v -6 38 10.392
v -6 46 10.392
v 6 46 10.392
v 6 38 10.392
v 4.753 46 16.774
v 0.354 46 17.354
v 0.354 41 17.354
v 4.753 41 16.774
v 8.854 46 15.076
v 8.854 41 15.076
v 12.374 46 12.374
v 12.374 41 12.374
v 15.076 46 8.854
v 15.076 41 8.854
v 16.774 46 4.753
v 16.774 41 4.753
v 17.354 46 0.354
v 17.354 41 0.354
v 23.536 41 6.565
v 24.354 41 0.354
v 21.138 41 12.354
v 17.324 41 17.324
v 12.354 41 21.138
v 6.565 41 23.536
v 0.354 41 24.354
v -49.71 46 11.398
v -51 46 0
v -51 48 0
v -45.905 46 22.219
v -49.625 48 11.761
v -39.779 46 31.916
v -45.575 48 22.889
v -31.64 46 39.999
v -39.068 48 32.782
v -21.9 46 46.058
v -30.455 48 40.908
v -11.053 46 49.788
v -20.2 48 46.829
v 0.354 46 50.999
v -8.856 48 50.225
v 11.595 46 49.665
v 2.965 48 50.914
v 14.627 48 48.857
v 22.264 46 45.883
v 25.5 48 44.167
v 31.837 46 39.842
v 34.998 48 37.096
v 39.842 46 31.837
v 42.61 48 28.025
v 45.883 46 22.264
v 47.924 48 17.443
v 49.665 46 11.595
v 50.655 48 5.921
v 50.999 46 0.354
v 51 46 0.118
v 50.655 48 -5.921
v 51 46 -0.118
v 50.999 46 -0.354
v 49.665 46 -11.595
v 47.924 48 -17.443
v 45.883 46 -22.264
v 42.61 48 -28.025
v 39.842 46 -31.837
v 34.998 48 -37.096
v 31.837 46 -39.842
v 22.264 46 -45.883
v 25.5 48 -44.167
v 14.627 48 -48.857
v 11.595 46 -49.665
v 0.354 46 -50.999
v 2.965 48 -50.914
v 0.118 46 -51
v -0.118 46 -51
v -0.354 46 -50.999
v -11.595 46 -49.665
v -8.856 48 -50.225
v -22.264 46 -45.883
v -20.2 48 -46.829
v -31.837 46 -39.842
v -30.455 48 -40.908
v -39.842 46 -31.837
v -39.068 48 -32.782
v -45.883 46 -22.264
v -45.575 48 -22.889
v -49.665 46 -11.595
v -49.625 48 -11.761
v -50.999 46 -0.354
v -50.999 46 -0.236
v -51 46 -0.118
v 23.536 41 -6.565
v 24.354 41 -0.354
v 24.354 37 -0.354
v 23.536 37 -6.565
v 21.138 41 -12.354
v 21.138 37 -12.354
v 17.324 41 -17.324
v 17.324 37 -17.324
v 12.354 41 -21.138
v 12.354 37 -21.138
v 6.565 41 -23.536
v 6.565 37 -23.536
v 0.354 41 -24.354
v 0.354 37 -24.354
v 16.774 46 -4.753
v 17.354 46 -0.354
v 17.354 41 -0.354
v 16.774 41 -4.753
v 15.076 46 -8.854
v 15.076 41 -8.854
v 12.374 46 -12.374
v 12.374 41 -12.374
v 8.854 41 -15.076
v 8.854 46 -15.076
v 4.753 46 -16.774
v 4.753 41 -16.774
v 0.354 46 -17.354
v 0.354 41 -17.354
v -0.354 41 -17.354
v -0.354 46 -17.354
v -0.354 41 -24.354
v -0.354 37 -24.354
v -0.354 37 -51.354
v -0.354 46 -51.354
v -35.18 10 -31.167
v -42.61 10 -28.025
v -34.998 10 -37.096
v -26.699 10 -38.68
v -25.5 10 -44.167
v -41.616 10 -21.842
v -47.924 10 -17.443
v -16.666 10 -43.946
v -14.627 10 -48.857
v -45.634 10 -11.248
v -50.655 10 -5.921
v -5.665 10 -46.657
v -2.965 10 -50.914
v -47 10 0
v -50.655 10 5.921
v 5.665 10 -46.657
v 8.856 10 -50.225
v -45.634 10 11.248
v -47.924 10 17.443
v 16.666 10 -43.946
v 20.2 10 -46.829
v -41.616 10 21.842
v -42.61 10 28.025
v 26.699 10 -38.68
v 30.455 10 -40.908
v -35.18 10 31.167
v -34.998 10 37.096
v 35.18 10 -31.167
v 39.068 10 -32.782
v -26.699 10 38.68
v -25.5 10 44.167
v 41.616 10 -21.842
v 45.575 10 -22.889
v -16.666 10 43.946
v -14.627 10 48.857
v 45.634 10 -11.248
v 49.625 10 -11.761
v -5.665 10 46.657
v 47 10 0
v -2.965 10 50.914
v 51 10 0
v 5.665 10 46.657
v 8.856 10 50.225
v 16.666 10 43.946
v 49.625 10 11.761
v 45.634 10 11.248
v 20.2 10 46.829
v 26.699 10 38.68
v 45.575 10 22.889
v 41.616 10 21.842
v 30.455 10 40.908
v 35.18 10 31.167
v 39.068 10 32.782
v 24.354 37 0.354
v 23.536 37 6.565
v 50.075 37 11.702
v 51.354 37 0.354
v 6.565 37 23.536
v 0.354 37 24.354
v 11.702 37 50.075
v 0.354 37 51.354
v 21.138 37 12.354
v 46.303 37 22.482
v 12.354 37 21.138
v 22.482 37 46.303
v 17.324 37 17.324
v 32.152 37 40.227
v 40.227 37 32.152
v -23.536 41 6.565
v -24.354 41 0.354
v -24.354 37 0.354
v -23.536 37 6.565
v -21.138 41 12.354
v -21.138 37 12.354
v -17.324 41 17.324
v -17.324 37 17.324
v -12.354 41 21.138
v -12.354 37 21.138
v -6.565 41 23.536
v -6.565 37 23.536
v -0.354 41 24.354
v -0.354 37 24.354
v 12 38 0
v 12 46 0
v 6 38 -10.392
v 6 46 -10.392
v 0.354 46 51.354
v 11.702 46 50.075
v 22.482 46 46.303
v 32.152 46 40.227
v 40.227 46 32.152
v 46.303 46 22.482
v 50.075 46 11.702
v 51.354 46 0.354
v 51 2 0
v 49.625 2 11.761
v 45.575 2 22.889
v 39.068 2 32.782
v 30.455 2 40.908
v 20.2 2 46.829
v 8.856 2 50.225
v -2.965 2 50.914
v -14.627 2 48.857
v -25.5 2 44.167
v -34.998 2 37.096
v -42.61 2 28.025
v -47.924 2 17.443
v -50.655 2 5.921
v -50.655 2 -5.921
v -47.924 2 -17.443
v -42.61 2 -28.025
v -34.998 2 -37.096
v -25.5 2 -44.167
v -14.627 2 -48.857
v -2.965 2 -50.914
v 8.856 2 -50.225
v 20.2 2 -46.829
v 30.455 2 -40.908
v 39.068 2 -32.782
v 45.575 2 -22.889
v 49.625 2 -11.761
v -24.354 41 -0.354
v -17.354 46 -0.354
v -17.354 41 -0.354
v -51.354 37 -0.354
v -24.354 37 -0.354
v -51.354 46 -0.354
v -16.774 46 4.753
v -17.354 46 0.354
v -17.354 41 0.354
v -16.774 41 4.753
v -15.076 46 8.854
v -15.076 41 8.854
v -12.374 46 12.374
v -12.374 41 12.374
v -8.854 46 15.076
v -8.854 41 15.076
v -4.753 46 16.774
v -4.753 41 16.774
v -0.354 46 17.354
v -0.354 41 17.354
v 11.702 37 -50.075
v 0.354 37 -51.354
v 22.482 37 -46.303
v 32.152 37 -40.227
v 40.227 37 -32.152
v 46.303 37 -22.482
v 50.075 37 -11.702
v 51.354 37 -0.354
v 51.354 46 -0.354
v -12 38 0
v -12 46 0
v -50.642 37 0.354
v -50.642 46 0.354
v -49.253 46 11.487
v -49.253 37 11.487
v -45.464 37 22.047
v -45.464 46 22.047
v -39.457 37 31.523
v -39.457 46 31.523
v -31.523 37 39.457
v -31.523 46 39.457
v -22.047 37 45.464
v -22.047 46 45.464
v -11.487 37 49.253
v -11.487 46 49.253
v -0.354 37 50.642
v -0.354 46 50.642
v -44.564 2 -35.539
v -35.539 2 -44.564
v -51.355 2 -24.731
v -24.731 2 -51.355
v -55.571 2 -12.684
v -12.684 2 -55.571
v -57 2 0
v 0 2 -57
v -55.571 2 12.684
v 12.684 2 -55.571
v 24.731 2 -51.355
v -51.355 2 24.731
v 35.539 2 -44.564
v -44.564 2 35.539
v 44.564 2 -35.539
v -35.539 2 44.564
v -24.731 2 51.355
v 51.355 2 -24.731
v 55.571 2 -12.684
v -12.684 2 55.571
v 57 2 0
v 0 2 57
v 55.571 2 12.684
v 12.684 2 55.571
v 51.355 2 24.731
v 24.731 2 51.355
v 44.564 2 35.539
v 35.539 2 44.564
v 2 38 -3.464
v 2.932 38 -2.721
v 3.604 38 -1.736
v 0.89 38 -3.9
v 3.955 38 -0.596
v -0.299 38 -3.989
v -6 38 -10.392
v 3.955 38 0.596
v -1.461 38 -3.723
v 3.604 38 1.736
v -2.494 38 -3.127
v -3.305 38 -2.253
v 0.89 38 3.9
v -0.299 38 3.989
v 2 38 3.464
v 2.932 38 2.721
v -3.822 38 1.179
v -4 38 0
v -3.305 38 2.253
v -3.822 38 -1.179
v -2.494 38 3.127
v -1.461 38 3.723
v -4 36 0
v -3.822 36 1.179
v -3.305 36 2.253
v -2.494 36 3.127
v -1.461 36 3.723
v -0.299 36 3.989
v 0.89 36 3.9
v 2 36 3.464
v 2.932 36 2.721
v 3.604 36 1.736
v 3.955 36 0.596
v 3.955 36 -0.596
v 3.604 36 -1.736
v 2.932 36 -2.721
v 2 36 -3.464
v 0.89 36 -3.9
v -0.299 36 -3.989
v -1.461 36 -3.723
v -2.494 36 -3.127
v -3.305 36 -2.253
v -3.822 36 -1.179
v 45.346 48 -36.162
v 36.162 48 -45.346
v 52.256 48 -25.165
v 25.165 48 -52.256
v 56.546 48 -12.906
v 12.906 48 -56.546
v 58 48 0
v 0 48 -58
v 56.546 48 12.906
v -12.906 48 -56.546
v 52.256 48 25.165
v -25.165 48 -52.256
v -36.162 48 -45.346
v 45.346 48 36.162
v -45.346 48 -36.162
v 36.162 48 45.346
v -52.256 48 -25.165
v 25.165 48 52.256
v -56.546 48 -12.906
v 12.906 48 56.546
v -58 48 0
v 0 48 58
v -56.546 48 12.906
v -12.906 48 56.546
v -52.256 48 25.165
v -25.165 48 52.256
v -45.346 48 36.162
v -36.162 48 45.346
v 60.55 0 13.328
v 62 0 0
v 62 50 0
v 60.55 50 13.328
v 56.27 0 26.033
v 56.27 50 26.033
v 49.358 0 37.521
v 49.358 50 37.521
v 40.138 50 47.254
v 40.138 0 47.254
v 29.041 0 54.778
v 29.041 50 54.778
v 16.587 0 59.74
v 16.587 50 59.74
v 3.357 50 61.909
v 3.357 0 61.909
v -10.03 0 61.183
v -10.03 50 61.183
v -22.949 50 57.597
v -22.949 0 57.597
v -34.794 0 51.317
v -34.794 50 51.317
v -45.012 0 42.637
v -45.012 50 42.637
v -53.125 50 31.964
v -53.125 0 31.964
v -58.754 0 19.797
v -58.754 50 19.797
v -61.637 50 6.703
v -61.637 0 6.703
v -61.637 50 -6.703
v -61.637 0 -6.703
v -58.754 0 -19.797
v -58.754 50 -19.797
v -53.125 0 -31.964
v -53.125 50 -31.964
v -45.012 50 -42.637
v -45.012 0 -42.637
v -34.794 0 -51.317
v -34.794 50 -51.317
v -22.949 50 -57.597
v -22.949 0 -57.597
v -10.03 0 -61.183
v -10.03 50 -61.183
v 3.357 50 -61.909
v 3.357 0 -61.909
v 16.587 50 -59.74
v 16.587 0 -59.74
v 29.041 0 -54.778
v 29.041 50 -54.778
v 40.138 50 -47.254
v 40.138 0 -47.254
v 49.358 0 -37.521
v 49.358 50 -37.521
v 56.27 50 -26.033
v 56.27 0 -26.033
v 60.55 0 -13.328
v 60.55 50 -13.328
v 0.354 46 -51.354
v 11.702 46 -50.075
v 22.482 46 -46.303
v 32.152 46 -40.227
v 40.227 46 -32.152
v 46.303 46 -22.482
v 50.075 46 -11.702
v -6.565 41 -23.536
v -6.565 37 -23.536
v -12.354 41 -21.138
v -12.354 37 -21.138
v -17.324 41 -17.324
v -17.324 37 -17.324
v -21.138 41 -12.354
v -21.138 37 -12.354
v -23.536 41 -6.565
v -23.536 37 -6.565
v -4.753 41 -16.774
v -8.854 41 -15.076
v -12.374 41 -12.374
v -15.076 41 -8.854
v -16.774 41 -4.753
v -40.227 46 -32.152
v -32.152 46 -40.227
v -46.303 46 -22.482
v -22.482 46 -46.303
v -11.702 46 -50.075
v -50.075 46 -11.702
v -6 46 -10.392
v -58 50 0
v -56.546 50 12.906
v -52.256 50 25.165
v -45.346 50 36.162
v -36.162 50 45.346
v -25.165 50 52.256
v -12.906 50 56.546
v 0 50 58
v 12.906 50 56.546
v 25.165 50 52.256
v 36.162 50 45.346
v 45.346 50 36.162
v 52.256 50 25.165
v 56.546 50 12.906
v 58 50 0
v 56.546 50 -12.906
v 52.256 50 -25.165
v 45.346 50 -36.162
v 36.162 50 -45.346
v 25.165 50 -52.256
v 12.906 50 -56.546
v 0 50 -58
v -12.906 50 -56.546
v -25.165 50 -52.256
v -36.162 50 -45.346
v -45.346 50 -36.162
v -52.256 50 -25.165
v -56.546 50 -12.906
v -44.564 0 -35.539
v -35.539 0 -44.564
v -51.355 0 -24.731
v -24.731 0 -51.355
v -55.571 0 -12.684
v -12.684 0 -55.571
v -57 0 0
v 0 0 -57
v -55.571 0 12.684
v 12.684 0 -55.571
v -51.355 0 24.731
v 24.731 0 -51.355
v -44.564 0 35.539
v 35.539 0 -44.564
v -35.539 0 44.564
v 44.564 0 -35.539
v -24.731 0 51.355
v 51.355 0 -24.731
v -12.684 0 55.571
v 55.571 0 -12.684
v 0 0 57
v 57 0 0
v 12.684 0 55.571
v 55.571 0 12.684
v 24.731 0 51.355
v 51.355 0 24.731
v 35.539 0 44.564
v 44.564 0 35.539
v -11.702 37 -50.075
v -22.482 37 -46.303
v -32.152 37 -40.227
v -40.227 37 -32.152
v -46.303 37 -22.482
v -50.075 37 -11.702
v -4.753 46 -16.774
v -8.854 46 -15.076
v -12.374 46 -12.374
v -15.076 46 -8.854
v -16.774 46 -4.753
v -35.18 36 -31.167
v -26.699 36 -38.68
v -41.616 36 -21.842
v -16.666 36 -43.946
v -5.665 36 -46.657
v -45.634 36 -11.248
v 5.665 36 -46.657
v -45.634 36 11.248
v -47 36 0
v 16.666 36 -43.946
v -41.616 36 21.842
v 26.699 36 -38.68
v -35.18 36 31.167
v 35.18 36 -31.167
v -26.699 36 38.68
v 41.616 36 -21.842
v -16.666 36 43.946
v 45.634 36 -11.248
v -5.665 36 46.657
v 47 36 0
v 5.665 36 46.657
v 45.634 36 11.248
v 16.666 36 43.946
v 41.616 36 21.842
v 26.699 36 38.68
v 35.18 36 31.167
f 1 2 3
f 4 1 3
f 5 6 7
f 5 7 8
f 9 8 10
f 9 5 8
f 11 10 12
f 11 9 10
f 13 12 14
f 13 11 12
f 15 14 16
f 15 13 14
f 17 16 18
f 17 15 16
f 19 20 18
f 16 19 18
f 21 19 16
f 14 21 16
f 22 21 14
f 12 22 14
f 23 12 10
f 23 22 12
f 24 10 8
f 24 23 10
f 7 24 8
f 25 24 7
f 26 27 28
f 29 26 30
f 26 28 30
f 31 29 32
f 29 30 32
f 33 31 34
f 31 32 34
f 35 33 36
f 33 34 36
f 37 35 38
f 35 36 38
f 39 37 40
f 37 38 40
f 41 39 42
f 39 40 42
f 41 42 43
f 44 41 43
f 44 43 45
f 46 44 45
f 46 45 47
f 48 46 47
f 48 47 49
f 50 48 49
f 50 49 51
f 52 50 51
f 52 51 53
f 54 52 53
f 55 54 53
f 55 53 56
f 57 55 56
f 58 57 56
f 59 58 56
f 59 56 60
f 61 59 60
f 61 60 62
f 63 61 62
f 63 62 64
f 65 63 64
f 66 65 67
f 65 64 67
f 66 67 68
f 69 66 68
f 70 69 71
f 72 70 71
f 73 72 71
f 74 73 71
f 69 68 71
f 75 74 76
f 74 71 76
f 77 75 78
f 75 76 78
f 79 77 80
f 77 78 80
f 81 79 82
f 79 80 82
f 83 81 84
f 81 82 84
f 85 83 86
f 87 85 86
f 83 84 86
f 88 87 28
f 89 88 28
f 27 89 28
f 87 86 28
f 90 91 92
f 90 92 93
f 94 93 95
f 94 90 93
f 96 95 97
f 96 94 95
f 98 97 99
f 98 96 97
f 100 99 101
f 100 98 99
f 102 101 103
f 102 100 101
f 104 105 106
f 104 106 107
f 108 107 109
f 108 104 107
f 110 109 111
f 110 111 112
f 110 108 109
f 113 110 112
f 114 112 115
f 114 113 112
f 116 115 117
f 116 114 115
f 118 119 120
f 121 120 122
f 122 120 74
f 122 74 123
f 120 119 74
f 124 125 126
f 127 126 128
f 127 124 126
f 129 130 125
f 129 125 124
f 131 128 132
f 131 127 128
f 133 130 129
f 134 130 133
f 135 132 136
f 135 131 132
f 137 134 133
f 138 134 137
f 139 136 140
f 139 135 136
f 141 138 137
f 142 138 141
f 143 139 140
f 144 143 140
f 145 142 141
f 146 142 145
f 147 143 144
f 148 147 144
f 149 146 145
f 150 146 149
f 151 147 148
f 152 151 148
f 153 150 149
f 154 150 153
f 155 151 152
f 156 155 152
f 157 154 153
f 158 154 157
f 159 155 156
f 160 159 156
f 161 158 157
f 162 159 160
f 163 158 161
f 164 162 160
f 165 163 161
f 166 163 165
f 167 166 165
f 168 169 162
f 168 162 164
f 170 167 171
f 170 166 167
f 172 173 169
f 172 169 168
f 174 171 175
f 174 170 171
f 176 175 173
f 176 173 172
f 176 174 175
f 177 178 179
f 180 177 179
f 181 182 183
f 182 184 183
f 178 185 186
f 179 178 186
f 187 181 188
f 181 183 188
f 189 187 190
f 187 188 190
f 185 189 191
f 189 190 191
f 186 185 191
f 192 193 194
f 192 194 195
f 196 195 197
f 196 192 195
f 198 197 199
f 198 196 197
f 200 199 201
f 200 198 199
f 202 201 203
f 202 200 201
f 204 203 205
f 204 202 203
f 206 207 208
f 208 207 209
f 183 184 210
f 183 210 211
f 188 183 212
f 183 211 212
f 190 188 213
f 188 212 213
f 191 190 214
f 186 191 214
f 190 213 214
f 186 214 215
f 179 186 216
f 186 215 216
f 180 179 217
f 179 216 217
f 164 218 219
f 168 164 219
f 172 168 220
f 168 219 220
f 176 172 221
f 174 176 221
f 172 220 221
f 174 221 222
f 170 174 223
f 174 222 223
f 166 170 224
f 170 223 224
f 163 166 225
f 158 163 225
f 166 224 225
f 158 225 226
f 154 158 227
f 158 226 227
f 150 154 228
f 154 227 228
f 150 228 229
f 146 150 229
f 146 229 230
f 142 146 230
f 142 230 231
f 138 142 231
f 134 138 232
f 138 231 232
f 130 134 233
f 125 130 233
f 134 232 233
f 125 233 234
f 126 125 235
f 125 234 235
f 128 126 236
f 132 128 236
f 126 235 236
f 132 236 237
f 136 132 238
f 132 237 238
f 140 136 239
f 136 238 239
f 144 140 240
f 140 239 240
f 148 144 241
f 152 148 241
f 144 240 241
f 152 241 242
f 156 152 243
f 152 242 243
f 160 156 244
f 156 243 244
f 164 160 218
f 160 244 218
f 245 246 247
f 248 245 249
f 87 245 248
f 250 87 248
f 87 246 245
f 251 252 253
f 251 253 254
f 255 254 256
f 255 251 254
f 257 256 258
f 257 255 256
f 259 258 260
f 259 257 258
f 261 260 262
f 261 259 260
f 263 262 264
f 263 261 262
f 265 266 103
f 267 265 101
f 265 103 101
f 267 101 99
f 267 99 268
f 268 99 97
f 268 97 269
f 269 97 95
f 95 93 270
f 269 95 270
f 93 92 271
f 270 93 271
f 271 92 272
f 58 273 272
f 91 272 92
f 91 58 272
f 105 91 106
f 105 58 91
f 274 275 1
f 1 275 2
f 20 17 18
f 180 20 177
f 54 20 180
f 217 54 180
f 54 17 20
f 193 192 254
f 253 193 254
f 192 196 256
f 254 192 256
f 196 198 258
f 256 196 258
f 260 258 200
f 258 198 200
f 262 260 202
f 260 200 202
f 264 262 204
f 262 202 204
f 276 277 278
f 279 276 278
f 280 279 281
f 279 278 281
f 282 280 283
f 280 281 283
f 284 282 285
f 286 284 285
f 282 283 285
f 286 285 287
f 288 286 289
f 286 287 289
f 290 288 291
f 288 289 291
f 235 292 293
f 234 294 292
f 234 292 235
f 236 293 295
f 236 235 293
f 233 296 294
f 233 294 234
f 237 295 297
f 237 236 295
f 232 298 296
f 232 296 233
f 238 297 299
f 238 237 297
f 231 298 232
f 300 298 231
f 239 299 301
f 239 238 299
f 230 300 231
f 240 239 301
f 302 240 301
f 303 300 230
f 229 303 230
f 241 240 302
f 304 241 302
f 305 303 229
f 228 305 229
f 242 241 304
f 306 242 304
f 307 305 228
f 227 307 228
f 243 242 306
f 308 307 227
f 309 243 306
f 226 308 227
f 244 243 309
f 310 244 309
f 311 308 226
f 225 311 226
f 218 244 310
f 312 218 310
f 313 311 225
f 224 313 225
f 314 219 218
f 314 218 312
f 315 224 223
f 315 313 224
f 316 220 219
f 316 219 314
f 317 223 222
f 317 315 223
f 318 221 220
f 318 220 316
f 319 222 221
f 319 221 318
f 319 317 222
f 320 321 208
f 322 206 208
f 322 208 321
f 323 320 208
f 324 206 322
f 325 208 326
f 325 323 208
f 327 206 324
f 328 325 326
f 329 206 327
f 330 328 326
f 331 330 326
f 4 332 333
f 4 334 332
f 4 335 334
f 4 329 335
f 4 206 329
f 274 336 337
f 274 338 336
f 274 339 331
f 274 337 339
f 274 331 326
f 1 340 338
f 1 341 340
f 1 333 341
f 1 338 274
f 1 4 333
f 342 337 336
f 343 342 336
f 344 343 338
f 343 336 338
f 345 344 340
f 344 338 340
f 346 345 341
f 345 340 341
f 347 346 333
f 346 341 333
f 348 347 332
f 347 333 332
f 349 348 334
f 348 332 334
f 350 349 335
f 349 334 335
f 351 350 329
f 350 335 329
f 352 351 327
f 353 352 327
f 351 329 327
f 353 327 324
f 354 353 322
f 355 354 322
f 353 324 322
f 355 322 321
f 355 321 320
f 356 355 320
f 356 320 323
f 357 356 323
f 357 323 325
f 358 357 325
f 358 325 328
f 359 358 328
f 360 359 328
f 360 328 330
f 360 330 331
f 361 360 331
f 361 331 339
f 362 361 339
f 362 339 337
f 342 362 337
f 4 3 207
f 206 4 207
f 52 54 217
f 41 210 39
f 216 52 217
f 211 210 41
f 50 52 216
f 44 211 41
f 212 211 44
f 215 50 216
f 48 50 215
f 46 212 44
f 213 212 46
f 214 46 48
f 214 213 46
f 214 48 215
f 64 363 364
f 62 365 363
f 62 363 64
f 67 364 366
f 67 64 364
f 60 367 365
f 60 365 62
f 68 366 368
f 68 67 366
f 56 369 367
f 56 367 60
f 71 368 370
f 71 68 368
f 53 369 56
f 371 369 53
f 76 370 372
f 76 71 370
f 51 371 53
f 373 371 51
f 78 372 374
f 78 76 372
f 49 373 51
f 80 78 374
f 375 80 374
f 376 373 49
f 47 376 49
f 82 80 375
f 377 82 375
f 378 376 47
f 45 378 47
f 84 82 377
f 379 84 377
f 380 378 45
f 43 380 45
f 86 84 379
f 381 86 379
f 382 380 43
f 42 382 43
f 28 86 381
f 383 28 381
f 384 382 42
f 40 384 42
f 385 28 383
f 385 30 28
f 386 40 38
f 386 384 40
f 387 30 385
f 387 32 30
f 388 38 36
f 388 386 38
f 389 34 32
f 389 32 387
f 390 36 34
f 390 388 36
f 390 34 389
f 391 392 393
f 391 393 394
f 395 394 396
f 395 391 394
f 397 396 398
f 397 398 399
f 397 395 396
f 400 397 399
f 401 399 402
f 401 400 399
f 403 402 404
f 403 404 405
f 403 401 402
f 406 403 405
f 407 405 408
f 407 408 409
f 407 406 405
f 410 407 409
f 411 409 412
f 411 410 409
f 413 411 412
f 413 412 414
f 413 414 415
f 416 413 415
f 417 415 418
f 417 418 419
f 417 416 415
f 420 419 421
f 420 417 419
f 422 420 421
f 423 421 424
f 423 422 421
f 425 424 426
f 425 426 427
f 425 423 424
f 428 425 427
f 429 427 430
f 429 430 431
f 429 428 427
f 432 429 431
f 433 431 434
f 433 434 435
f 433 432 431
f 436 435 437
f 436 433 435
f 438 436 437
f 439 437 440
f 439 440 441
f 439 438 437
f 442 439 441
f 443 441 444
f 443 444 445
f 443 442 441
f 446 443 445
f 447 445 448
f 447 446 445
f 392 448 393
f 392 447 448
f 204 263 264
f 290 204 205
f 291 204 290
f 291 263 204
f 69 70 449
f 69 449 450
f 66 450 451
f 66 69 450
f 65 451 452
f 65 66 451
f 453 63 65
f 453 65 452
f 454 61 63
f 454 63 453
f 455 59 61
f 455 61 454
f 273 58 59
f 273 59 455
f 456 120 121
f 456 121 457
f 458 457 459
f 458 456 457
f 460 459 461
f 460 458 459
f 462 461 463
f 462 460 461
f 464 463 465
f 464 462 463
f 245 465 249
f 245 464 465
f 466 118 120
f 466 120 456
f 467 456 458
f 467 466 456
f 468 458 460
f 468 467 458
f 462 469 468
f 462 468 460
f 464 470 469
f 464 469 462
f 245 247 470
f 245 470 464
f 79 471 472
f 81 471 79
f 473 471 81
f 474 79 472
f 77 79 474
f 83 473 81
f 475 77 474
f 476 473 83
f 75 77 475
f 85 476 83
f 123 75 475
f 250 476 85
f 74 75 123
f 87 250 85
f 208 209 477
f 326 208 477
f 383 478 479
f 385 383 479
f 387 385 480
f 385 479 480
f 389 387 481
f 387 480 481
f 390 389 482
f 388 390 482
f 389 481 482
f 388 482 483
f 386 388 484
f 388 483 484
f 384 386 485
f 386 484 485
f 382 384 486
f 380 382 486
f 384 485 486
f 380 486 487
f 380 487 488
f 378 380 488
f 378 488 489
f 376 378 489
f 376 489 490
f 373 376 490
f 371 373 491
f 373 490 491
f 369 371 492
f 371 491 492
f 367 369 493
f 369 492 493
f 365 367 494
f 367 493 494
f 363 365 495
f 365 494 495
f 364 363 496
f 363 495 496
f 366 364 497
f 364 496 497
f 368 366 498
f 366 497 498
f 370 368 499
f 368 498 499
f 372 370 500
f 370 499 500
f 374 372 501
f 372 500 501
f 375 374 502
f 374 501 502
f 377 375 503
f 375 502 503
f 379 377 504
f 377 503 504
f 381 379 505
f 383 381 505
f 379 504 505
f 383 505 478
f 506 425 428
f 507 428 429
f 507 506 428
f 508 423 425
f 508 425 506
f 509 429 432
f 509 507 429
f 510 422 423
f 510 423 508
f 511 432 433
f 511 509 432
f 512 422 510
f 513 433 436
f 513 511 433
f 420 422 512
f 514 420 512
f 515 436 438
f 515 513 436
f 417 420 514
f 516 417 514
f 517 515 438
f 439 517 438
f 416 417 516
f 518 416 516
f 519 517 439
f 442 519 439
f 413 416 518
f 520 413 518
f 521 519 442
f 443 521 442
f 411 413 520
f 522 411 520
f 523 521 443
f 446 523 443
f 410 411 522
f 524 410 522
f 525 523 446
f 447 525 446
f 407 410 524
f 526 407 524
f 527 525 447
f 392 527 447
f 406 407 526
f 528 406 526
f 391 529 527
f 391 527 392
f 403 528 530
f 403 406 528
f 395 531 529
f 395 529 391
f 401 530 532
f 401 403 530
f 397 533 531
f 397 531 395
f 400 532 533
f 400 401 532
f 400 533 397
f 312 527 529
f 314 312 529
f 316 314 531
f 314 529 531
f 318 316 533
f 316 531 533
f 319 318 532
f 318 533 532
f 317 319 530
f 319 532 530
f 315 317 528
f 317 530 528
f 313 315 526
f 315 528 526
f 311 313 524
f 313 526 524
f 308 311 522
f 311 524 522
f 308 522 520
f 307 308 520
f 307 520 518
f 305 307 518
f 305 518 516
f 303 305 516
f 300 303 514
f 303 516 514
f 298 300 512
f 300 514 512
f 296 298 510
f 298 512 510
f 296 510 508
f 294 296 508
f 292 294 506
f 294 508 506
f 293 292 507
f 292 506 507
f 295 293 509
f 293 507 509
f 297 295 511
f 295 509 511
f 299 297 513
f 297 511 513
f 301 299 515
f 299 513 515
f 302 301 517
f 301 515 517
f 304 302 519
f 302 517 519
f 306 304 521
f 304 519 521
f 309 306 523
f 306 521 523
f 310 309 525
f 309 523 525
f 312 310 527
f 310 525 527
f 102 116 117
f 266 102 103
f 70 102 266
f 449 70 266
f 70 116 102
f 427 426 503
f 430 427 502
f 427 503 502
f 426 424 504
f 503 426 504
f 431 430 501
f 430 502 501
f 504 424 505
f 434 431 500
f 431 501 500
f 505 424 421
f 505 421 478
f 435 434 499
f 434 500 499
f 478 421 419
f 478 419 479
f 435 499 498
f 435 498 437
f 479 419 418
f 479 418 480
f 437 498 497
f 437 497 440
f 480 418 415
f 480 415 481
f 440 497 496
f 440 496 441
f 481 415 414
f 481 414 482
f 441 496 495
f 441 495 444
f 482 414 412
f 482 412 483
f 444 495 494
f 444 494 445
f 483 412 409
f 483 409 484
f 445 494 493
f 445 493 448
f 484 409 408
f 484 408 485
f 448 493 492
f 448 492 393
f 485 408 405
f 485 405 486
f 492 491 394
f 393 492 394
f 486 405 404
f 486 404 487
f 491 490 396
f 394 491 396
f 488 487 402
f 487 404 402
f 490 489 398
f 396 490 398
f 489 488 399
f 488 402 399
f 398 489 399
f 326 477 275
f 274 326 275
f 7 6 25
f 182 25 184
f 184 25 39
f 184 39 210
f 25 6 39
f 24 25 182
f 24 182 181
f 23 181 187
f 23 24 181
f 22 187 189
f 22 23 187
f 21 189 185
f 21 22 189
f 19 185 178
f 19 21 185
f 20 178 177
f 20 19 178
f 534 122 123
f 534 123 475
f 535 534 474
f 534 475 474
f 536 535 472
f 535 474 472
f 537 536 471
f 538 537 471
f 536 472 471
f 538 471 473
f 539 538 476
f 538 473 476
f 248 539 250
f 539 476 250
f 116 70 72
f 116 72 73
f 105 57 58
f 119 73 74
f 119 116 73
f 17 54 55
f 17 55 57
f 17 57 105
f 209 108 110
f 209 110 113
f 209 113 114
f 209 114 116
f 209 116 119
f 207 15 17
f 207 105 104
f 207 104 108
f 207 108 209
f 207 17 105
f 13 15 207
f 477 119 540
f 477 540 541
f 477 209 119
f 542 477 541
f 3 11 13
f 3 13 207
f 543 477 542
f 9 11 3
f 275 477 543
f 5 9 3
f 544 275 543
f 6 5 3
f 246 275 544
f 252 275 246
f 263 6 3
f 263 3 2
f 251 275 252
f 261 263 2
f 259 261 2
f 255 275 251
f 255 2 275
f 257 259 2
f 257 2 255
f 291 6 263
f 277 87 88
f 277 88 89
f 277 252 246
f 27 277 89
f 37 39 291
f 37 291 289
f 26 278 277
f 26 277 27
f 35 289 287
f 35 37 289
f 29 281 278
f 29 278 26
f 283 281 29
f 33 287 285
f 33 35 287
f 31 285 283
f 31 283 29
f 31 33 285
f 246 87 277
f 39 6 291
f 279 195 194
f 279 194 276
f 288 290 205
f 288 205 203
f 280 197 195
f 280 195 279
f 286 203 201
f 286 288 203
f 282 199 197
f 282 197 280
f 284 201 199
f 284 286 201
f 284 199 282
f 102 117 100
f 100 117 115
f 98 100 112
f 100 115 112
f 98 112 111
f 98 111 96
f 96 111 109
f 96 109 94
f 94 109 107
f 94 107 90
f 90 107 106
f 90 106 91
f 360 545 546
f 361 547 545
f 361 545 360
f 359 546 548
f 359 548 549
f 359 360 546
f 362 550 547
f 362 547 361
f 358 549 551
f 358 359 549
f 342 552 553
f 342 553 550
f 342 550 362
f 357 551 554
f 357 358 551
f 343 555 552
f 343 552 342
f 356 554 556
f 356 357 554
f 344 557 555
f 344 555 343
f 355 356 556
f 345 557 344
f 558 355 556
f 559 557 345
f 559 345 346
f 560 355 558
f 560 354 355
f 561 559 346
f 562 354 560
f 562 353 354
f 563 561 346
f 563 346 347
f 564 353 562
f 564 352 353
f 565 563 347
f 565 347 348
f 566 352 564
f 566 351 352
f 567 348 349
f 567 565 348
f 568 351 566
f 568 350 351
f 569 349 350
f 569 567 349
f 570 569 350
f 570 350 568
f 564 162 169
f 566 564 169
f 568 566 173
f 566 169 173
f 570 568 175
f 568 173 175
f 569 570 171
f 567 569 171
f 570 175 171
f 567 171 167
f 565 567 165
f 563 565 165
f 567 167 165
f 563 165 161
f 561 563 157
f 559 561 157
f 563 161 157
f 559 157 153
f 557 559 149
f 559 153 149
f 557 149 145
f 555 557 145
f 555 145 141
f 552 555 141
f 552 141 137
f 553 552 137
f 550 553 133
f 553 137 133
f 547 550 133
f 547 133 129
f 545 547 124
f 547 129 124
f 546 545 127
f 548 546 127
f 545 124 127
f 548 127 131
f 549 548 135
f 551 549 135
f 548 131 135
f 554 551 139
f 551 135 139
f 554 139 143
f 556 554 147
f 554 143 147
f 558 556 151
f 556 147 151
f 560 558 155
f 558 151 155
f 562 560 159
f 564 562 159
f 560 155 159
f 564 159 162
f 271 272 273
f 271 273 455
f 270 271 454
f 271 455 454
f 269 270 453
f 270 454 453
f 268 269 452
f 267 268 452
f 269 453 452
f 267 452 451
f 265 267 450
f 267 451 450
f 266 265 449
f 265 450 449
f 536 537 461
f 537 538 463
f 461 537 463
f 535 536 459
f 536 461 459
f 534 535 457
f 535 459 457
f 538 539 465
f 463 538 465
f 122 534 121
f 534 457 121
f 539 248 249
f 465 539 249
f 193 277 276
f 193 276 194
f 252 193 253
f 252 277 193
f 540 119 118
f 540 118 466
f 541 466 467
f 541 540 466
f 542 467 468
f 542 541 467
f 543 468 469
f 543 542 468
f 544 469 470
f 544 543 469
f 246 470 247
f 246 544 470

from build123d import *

# Parameters (mm, degrees)
SKETCH012_AS_DRAWN_R                 = 62
EXTRUDE005_DEPTH                     = 50
EXTRUDE005_ONTO_SKETCH012_ROLL_ANGLE = 90
SKETCH013_R                          = 57
POCKET003_DEPTH                      = 2
SKETCH014_R                          = 51
POCKET004_DEPTH                      = 8
SKETCH015_R                          = 47
POCKET005_DEPTH                      = 26
SKETCH016_R                          = 58
POCKET006_DEPTH                      = 2
SKETCH017_R                          = 51
POCKET007_DEPTH                      = 2
POCKET008_DEPTH                      = 9
POCKET009_DEPTH                      = 5
POCKET010_DEPTH                      = 8
SKETCH022_R                          = 4
POCKET011_DEPTH                      = 38.001


with BuildPart() as part:
    # Sketch012 as drawn → Extrude005 (new)
    with BuildSketch(Plane.XY):
        Circle(SKETCH012_AS_DRAWN_R)
    extrude(amount=-EXTRUDE005_DEPTH)


with BuildPart() as part_1:
    # Extrude005 onto Sketch012 roll: moved
    add(part.part.rotate(Axis((0, 0, 0), (1, 0, 0)), EXTRUDE005_ONTO_SKETCH012_ROLL_ANGLE))


with BuildPart() as part_2:
    # Extrude005 onto Sketch012 placement: moved
    add(part_1.part)

    # Sketch013 → Pocket003 (cut)
    with BuildSketch(Plane.XZ):
        Circle(SKETCH013_R)
    extrude(amount=-POCKET003_DEPTH, mode=Mode.SUBTRACT)

    # Sketch014 → Pocket004 (cut)
    with BuildSketch(Plane.XZ.offset(-2)):
        Circle(SKETCH014_R)
    extrude(amount=-POCKET004_DEPTH, mode=Mode.SUBTRACT)

    # Sketch015 → Pocket005 (cut)
    with BuildSketch(Plane.XZ.offset(-10)):
        Circle(SKETCH015_R)
    extrude(amount=-POCKET005_DEPTH, mode=Mode.SUBTRACT)

    # Sketch016 → Pocket006 (cut)
    with BuildSketch(Plane(origin=(0, 50, 0), x_dir=(-1, 0, 0), z_dir=(0, 1, 0))):
        Circle(SKETCH016_R)
    extrude(amount=-POCKET006_DEPTH, mode=Mode.SUBTRACT)

    # Sketch017 → Pocket007 (cut)
    with BuildSketch(Plane(origin=(0, 48, 0), x_dir=(-1, 0, 0), z_dir=(0, 1, 0))):
        Circle(SKETCH017_R)
    extrude(amount=-POCKET007_DEPTH, mode=Mode.SUBTRACT)

    # Sketch019 → Pocket008 (cut)
    with BuildSketch(Plane(origin=(0, 46, 0), x_dir=(-1, 0, 0), z_dir=(0, 1, 0))):
        with BuildLine():
            ThreePointArc((50.641544, 0.353553), (35.708892, 35.708892), (0.353553, 50.641544))
            Line((0.353553, 24.353553), (0.353553, 50.641544))
            ThreePointArc((24.353553, 0.353553), (17.324116, 17.324116), (0.353553, 24.353553))
            Line((24.353553, 0.353553), (50.641544, 0.353553))
        make_face()
        with BuildLine():
            ThreePointArc((0.353553, -24.353553), (17.324116, -17.324116), (24.353553, -0.353553))
            Line((24.353553, -0.353553), (51.353553, -0.353553))
            ThreePointArc((0.353553, -51.353553), (36.415999, -36.415999), (51.353553, -0.353553))
            Line((0.353553, -24.353553), (0.353553, -51.353553))
        make_face()
        with BuildLine():
            ThreePointArc((-24.353553, -0.353553), (-17.324116, -17.324116), (-0.353553, -24.353553))
            Line((-0.353553, -24.353553), (-0.353553, -51.353553))
            ThreePointArc((-51.353553, -0.353553), (-36.415999, -36.415999), (-0.353553, -51.353553))
            Line((-24.353553, -0.353553), (-51.353553, -0.353553))
        make_face()
        with BuildLine():
            ThreePointArc((-0.353553, 24.353553), (-17.324116, 17.324116), (-24.353553, 0.353553))
            Line((-24.353553, 0.353553), (-51.353553, 0.353553))
            ThreePointArc((-0.353553, 51.353553), (-36.415999, 36.415999), (-51.353553, 0.353553))
            Line((-0.353553, 24.353553), (-0.353553, 51.353553))
        make_face()
    extrude(amount=-POCKET008_DEPTH, mode=Mode.SUBTRACT)

    # Sketch020 → Pocket009 (cut)
    with BuildSketch(Plane(origin=(0, 46, 0), x_dir=(-1, 0, 0), z_dir=(0, 1, 0))):
        with BuildLine():
            Line((-24.353553, 0.353553), (-17.35351, 0.353553))
            ThreePointArc((-0.353553, 17.353553), (-12.374341, 12.374353), (-17.35351, 0.353553))
            Line((-0.353553, 17.353553), (-0.353553, 24.353553))
            Line((-0.353553, 24.353553), (-24.353553, 24.353553))
            Line((-24.353553, 24.353553), (-24.353553, 0.353553))
        make_face()
        with BuildLine():
            Line((24.353553, 0.353553), (17.353553, 0.353553))
            ThreePointArc((17.353553, 0.353553), (12.374369, 12.374369), (0.353553, 17.353553))
            Line((0.353553, 17.353553), (0.353553, 24.353553))
            Line((0.353553, 24.353553), (24.353553, 24.353553))
            Line((24.353553, 24.353553), (24.353553, 0.353553))
        make_face()
        with BuildLine():
            Line((-0.353553, -24.353553), (-24.353553, -24.353553))
            Line((-24.353553, -24.353553), (-24.353553, -0.353553))
            Line((-24.353553, -0.353553), (-17.35351, -0.353553))
            ThreePointArc((-17.35351, -0.353553), (-12.374341, -12.374353), (-0.353553, -17.353553))
            Line((-0.353553, -17.353553), (-0.353553, -24.353553))
        make_face()
        with BuildLine():
            Line((0.353553, -24.353553), (24.353553, -24.353553))
            Line((24.353553, -24.353553), (24.353553, -0.353553))
            Line((24.353553, -0.353553), (17.353553, -0.353553))
            ThreePointArc((0.353553, -17.353553), (12.374369, -12.374369), (17.353553, -0.353553))
            Line((0.353553, -17.353553), (0.353553, -24.353553))
        make_face()
    extrude(amount=-POCKET009_DEPTH, mode=Mode.SUBTRACT)

    # Sketch021 → Pocket010 (cut)
    with BuildSketch(Plane(origin=(0, 46, 0), x_dir=(-1, 0, 0), z_dir=(0, 1, 0))):
        Polygon((6, -10.392305), (12, 0), (6, 10.392305), (-6, 10.392305), (-12, 0), (-6, -10.392305), align=None)
    extrude(amount=-POCKET010_DEPTH, mode=Mode.SUBTRACT)

    # Sketch022 → Pocket011 (cut, through all)
    with BuildSketch(Plane(origin=(0, 38, 0), x_dir=(-1, 0, 0), z_dir=(0, 1, 0))):
        Circle(SKETCH022_R)
    extrude(amount=-POCKET011_DEPTH, mode=Mode.SUBTRACT)


solid = part_2.part
